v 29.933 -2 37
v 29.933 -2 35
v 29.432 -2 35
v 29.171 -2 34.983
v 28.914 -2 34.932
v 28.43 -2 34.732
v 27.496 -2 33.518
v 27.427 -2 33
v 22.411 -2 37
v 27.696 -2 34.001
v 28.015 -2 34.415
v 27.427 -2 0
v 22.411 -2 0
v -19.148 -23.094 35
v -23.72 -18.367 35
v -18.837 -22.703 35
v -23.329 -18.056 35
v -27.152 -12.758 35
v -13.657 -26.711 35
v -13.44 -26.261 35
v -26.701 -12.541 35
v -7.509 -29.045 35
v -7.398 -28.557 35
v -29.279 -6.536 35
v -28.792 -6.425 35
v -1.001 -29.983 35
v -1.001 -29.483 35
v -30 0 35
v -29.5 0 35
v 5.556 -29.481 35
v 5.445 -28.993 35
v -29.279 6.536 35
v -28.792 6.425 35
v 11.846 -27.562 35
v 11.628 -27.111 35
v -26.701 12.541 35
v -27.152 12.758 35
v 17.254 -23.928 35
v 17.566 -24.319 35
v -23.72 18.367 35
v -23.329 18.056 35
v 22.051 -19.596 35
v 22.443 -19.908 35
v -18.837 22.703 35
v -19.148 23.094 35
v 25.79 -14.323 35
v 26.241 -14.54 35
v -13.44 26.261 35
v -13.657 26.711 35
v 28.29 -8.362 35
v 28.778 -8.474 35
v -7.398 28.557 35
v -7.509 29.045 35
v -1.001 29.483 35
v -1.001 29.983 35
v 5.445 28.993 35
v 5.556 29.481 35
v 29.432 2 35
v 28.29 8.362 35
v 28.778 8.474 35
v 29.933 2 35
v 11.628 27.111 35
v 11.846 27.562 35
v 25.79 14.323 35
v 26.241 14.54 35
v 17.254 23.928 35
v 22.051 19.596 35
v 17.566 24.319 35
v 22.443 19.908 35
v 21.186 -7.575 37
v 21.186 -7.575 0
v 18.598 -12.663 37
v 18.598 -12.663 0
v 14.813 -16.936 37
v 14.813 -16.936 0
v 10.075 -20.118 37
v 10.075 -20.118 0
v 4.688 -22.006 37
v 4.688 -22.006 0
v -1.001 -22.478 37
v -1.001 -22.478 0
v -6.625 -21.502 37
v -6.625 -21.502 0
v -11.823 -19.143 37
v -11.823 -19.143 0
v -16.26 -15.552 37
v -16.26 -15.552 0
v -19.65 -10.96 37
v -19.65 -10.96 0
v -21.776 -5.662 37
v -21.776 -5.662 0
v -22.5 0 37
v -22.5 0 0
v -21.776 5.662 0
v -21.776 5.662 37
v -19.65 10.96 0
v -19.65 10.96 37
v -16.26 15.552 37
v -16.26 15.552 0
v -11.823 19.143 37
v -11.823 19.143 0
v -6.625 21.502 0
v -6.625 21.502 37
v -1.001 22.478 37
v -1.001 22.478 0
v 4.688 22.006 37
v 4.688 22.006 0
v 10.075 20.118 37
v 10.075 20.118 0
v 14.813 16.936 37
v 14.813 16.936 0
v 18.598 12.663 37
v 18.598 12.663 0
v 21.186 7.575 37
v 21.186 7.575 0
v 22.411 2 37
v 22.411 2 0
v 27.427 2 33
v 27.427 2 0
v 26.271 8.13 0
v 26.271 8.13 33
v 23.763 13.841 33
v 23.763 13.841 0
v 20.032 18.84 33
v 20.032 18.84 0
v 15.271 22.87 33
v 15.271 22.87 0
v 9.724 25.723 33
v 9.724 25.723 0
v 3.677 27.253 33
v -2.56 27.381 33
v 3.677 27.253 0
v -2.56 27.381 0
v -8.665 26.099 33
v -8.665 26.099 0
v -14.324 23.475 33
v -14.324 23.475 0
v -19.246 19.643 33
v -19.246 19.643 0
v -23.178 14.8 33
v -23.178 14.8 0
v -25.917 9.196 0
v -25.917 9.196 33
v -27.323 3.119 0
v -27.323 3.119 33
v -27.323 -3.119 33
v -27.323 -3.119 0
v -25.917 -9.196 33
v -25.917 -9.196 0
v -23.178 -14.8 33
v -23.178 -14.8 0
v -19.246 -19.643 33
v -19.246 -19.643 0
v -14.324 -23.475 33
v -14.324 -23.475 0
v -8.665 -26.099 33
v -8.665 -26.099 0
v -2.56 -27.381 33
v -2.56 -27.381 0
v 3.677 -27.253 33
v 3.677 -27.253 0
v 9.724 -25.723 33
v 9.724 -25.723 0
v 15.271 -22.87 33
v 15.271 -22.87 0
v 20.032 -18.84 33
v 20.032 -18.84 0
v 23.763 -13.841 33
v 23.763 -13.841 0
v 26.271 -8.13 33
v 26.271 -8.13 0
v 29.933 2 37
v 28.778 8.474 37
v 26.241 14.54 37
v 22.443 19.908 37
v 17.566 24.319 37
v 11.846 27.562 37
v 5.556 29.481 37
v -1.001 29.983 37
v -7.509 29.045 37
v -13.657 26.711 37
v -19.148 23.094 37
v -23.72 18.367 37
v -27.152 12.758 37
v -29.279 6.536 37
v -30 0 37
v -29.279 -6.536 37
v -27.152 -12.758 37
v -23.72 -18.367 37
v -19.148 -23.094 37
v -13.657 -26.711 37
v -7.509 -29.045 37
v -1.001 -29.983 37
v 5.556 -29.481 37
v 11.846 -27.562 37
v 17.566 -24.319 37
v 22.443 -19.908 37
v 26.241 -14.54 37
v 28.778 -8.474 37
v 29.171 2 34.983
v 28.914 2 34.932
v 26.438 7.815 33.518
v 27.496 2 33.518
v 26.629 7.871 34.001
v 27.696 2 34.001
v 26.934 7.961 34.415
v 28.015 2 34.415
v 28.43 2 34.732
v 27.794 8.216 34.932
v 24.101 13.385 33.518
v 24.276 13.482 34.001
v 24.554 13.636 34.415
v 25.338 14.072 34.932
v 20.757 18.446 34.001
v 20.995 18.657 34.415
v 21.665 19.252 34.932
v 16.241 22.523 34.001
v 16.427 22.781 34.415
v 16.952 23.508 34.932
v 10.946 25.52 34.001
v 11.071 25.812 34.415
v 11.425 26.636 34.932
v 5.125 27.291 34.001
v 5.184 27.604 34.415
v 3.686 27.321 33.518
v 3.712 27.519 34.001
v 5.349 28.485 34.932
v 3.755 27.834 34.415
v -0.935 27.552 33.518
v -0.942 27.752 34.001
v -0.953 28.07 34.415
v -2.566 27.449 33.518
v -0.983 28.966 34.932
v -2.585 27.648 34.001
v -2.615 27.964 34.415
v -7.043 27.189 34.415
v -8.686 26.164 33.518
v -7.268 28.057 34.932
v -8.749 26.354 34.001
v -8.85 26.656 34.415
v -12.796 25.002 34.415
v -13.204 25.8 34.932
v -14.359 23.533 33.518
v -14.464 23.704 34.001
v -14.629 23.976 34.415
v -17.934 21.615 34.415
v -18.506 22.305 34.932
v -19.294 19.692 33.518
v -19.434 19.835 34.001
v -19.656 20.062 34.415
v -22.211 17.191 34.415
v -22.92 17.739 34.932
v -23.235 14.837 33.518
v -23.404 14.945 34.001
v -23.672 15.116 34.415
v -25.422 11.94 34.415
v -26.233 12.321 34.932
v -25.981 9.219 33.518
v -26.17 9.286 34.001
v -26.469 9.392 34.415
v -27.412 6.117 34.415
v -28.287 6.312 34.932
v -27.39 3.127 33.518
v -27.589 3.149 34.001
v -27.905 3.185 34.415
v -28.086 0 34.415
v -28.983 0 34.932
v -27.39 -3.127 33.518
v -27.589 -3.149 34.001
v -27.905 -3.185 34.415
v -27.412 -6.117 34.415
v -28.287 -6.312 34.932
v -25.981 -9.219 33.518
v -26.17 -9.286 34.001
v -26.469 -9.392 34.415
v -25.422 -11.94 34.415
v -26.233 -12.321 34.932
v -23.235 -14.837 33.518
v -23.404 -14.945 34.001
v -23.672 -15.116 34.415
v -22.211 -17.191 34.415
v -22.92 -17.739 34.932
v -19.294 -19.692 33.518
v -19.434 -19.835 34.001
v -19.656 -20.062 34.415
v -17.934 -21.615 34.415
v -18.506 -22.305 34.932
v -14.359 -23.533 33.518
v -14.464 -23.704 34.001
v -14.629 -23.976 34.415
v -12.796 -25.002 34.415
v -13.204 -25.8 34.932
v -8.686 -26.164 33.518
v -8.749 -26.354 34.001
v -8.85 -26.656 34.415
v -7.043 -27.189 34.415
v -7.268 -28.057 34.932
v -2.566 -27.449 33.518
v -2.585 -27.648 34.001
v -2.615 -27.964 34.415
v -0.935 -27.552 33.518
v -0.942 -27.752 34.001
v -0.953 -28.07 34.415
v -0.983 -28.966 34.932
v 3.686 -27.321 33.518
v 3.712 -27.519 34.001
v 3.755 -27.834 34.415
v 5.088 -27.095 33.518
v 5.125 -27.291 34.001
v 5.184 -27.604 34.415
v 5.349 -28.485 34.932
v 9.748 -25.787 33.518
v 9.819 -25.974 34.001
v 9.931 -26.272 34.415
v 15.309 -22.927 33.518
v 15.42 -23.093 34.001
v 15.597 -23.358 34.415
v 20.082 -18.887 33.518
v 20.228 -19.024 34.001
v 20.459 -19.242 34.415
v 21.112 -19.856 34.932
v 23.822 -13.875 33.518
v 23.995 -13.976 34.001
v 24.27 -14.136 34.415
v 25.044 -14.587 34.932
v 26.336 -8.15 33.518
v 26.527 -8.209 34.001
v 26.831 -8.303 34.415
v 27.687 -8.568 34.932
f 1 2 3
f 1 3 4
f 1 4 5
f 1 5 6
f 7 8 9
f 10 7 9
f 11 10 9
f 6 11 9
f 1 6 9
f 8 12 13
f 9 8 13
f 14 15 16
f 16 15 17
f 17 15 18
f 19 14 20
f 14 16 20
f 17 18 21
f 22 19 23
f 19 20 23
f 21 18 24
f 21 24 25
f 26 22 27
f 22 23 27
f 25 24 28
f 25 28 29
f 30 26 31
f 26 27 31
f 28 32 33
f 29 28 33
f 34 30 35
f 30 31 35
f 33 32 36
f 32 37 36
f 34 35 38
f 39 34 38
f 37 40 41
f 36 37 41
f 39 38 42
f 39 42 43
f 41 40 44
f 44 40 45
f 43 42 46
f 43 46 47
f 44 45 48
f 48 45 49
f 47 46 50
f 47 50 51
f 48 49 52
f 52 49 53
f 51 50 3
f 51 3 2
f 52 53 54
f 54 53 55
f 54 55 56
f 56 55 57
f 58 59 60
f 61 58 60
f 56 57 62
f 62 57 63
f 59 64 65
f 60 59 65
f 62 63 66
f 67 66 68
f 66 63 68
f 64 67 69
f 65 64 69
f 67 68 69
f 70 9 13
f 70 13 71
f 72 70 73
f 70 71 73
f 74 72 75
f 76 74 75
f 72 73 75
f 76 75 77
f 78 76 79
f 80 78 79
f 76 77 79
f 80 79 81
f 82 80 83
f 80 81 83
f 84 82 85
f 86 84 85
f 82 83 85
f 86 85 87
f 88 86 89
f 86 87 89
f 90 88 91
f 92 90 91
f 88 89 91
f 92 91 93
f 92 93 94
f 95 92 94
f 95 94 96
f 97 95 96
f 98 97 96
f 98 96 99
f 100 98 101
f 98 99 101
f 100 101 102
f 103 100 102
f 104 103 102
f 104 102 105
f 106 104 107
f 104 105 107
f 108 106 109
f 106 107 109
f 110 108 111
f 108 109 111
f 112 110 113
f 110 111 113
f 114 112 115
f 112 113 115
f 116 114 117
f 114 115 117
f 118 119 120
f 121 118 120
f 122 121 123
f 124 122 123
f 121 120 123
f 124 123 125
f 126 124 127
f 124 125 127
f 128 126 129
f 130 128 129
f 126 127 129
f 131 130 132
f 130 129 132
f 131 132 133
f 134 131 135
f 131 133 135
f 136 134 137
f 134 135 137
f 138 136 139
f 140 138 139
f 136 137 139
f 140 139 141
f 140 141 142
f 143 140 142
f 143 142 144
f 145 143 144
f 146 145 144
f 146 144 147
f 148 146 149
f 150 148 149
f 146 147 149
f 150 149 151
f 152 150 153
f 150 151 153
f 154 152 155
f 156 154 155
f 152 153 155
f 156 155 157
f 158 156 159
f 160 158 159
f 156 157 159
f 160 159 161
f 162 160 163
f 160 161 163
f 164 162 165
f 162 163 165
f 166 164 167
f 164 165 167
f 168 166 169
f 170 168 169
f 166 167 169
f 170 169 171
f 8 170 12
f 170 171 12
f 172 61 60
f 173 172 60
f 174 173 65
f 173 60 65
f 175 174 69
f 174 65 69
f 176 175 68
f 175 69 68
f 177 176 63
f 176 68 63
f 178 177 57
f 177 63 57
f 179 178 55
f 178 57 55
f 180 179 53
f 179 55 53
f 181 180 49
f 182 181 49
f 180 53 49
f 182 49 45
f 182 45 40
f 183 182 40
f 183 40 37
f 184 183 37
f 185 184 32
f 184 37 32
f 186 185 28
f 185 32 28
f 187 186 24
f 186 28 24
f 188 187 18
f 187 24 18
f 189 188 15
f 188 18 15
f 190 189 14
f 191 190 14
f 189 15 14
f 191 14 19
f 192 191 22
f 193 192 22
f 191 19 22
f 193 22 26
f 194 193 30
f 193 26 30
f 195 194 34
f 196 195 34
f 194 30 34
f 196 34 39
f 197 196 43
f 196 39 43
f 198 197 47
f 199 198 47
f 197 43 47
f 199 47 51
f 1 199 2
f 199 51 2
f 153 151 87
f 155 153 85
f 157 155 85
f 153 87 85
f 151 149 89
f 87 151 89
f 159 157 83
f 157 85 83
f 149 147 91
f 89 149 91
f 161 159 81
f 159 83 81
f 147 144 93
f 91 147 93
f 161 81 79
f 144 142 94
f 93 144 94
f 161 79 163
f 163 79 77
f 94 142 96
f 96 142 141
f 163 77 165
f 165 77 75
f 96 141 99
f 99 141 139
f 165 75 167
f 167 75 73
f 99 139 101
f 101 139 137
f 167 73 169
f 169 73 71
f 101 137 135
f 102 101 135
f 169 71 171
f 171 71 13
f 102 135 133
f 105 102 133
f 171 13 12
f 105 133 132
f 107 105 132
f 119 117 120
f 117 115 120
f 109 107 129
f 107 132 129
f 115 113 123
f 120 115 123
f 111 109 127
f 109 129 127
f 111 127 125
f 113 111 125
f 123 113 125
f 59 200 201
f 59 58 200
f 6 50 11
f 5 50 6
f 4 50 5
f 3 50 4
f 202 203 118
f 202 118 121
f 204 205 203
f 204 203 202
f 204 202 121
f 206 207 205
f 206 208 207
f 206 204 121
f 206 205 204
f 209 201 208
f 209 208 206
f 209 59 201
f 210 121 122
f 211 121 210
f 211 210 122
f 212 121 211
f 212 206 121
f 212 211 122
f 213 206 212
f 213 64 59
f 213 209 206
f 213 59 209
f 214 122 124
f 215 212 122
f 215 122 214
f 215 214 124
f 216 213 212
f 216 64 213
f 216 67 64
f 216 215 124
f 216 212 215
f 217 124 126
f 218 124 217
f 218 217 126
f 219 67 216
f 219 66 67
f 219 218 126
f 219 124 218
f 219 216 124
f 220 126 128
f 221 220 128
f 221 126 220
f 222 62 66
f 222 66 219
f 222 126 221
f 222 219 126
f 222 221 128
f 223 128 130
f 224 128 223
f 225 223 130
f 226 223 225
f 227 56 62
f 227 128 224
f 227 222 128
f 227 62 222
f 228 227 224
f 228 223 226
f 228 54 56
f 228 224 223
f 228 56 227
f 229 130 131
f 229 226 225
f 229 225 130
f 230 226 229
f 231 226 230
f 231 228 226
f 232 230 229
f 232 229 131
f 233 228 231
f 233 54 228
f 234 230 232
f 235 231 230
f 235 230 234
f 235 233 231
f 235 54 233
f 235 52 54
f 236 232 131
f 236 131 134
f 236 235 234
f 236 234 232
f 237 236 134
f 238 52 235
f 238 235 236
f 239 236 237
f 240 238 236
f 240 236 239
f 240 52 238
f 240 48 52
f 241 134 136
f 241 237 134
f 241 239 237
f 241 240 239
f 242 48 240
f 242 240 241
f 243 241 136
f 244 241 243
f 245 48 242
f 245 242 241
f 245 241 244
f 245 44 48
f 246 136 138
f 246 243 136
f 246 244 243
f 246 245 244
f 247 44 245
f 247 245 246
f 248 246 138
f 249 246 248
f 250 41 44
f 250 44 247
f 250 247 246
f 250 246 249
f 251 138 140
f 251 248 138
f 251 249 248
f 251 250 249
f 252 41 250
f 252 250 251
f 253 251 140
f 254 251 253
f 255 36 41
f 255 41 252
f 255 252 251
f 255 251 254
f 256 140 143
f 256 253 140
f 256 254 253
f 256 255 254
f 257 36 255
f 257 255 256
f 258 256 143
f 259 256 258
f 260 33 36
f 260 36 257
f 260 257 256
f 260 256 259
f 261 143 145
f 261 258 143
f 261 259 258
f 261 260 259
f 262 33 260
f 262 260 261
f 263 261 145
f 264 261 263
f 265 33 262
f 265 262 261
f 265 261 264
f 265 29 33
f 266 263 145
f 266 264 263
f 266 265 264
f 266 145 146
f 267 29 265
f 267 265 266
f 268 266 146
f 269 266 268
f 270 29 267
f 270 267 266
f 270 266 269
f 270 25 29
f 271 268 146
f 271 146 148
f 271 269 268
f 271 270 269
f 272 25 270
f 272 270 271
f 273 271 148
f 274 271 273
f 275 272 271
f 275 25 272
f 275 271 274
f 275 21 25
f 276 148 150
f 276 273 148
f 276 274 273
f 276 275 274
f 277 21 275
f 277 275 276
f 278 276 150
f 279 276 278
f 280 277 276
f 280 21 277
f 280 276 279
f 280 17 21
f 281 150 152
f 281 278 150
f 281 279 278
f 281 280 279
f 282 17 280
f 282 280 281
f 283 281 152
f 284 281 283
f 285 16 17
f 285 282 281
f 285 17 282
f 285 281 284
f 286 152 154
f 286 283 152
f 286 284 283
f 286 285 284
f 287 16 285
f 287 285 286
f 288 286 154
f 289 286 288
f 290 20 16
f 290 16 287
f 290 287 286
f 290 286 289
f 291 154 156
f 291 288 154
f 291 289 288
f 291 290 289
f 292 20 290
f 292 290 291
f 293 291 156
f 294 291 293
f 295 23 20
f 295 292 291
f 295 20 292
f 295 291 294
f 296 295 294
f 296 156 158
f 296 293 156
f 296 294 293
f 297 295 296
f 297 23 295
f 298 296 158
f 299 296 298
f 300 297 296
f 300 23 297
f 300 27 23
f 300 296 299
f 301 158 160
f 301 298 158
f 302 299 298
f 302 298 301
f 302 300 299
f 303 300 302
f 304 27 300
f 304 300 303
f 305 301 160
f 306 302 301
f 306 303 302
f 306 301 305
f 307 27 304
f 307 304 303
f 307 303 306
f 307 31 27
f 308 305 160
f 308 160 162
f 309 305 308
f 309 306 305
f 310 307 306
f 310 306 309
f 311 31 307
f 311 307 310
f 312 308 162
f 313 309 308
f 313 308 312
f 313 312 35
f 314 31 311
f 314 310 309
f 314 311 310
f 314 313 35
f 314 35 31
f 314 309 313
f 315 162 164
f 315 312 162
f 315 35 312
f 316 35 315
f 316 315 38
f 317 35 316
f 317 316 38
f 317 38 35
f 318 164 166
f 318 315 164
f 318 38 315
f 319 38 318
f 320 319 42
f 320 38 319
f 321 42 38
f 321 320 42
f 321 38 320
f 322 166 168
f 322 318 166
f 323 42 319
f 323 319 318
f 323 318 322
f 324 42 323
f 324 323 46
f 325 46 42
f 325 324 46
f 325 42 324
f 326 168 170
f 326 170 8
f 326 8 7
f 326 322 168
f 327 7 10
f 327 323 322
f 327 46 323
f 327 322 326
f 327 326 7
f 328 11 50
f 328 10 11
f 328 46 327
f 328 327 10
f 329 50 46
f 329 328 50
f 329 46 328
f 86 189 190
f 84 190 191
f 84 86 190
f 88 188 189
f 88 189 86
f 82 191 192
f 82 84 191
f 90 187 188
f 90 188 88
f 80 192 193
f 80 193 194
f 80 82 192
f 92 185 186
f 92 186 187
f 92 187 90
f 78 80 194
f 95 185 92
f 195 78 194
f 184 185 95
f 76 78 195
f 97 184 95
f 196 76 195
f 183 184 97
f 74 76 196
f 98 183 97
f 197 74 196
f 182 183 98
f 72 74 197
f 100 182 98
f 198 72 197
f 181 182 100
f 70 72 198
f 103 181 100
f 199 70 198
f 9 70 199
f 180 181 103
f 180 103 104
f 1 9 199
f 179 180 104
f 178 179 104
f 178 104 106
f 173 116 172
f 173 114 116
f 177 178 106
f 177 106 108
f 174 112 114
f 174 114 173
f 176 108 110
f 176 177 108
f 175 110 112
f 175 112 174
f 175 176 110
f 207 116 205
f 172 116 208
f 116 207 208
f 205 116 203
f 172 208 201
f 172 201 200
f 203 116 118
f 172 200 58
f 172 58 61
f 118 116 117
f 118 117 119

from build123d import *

# Parameters (mm, degrees)
EXTRUDE_1_DEPTH = 35
EXTRUDE_2_DEPTH = 2
FILLET_1_R      = 2


with BuildPart() as part:
    # Эскиз1 → Бобышка-Вытянуть1 (new body)
    with BuildSketch(Plane.XY):
        with BuildLine():
            Line((22.410934831, 2), (27.427176304, 2))
            ThreePointArc((27.427176304, 2), (-27.5, 0), (27.427176304, -2))
            Line((27.427176304, -2), (22.410934831, -2))
            ThreePointArc((22.410934831, -2), (-22.5, 0), (22.410934831, 2))
        make_face()
    extrude(amount=EXTRUDE_1_DEPTH)

    # Эскиз2 → Бобышка-Вытянуть2 (add)
    with BuildSketch(Plane.XY.offset(35)):
        with BuildLine():
            Line((22.410934831, 2), (29.933259094, 2))
            ThreePointArc((29.933259094, 2), (-30, 0), (29.933259094, -2))
            Line((29.933259094, -2), (22.410934831, -2))
            ThreePointArc((22.410934831, -2), (-22.5, 0), (22.410934831, 2))
        make_face()
    extrude(amount=EXTRUDE_2_DEPTH)

    # Скругление1
    fillet_1_edges = [part.edges().sort_by_distance(p)[0] for p in [
        (-27.5, 0, 35),
    ]]
    fillet(fillet_1_edges, radius=FILLET_1_R)


solid = part.part
